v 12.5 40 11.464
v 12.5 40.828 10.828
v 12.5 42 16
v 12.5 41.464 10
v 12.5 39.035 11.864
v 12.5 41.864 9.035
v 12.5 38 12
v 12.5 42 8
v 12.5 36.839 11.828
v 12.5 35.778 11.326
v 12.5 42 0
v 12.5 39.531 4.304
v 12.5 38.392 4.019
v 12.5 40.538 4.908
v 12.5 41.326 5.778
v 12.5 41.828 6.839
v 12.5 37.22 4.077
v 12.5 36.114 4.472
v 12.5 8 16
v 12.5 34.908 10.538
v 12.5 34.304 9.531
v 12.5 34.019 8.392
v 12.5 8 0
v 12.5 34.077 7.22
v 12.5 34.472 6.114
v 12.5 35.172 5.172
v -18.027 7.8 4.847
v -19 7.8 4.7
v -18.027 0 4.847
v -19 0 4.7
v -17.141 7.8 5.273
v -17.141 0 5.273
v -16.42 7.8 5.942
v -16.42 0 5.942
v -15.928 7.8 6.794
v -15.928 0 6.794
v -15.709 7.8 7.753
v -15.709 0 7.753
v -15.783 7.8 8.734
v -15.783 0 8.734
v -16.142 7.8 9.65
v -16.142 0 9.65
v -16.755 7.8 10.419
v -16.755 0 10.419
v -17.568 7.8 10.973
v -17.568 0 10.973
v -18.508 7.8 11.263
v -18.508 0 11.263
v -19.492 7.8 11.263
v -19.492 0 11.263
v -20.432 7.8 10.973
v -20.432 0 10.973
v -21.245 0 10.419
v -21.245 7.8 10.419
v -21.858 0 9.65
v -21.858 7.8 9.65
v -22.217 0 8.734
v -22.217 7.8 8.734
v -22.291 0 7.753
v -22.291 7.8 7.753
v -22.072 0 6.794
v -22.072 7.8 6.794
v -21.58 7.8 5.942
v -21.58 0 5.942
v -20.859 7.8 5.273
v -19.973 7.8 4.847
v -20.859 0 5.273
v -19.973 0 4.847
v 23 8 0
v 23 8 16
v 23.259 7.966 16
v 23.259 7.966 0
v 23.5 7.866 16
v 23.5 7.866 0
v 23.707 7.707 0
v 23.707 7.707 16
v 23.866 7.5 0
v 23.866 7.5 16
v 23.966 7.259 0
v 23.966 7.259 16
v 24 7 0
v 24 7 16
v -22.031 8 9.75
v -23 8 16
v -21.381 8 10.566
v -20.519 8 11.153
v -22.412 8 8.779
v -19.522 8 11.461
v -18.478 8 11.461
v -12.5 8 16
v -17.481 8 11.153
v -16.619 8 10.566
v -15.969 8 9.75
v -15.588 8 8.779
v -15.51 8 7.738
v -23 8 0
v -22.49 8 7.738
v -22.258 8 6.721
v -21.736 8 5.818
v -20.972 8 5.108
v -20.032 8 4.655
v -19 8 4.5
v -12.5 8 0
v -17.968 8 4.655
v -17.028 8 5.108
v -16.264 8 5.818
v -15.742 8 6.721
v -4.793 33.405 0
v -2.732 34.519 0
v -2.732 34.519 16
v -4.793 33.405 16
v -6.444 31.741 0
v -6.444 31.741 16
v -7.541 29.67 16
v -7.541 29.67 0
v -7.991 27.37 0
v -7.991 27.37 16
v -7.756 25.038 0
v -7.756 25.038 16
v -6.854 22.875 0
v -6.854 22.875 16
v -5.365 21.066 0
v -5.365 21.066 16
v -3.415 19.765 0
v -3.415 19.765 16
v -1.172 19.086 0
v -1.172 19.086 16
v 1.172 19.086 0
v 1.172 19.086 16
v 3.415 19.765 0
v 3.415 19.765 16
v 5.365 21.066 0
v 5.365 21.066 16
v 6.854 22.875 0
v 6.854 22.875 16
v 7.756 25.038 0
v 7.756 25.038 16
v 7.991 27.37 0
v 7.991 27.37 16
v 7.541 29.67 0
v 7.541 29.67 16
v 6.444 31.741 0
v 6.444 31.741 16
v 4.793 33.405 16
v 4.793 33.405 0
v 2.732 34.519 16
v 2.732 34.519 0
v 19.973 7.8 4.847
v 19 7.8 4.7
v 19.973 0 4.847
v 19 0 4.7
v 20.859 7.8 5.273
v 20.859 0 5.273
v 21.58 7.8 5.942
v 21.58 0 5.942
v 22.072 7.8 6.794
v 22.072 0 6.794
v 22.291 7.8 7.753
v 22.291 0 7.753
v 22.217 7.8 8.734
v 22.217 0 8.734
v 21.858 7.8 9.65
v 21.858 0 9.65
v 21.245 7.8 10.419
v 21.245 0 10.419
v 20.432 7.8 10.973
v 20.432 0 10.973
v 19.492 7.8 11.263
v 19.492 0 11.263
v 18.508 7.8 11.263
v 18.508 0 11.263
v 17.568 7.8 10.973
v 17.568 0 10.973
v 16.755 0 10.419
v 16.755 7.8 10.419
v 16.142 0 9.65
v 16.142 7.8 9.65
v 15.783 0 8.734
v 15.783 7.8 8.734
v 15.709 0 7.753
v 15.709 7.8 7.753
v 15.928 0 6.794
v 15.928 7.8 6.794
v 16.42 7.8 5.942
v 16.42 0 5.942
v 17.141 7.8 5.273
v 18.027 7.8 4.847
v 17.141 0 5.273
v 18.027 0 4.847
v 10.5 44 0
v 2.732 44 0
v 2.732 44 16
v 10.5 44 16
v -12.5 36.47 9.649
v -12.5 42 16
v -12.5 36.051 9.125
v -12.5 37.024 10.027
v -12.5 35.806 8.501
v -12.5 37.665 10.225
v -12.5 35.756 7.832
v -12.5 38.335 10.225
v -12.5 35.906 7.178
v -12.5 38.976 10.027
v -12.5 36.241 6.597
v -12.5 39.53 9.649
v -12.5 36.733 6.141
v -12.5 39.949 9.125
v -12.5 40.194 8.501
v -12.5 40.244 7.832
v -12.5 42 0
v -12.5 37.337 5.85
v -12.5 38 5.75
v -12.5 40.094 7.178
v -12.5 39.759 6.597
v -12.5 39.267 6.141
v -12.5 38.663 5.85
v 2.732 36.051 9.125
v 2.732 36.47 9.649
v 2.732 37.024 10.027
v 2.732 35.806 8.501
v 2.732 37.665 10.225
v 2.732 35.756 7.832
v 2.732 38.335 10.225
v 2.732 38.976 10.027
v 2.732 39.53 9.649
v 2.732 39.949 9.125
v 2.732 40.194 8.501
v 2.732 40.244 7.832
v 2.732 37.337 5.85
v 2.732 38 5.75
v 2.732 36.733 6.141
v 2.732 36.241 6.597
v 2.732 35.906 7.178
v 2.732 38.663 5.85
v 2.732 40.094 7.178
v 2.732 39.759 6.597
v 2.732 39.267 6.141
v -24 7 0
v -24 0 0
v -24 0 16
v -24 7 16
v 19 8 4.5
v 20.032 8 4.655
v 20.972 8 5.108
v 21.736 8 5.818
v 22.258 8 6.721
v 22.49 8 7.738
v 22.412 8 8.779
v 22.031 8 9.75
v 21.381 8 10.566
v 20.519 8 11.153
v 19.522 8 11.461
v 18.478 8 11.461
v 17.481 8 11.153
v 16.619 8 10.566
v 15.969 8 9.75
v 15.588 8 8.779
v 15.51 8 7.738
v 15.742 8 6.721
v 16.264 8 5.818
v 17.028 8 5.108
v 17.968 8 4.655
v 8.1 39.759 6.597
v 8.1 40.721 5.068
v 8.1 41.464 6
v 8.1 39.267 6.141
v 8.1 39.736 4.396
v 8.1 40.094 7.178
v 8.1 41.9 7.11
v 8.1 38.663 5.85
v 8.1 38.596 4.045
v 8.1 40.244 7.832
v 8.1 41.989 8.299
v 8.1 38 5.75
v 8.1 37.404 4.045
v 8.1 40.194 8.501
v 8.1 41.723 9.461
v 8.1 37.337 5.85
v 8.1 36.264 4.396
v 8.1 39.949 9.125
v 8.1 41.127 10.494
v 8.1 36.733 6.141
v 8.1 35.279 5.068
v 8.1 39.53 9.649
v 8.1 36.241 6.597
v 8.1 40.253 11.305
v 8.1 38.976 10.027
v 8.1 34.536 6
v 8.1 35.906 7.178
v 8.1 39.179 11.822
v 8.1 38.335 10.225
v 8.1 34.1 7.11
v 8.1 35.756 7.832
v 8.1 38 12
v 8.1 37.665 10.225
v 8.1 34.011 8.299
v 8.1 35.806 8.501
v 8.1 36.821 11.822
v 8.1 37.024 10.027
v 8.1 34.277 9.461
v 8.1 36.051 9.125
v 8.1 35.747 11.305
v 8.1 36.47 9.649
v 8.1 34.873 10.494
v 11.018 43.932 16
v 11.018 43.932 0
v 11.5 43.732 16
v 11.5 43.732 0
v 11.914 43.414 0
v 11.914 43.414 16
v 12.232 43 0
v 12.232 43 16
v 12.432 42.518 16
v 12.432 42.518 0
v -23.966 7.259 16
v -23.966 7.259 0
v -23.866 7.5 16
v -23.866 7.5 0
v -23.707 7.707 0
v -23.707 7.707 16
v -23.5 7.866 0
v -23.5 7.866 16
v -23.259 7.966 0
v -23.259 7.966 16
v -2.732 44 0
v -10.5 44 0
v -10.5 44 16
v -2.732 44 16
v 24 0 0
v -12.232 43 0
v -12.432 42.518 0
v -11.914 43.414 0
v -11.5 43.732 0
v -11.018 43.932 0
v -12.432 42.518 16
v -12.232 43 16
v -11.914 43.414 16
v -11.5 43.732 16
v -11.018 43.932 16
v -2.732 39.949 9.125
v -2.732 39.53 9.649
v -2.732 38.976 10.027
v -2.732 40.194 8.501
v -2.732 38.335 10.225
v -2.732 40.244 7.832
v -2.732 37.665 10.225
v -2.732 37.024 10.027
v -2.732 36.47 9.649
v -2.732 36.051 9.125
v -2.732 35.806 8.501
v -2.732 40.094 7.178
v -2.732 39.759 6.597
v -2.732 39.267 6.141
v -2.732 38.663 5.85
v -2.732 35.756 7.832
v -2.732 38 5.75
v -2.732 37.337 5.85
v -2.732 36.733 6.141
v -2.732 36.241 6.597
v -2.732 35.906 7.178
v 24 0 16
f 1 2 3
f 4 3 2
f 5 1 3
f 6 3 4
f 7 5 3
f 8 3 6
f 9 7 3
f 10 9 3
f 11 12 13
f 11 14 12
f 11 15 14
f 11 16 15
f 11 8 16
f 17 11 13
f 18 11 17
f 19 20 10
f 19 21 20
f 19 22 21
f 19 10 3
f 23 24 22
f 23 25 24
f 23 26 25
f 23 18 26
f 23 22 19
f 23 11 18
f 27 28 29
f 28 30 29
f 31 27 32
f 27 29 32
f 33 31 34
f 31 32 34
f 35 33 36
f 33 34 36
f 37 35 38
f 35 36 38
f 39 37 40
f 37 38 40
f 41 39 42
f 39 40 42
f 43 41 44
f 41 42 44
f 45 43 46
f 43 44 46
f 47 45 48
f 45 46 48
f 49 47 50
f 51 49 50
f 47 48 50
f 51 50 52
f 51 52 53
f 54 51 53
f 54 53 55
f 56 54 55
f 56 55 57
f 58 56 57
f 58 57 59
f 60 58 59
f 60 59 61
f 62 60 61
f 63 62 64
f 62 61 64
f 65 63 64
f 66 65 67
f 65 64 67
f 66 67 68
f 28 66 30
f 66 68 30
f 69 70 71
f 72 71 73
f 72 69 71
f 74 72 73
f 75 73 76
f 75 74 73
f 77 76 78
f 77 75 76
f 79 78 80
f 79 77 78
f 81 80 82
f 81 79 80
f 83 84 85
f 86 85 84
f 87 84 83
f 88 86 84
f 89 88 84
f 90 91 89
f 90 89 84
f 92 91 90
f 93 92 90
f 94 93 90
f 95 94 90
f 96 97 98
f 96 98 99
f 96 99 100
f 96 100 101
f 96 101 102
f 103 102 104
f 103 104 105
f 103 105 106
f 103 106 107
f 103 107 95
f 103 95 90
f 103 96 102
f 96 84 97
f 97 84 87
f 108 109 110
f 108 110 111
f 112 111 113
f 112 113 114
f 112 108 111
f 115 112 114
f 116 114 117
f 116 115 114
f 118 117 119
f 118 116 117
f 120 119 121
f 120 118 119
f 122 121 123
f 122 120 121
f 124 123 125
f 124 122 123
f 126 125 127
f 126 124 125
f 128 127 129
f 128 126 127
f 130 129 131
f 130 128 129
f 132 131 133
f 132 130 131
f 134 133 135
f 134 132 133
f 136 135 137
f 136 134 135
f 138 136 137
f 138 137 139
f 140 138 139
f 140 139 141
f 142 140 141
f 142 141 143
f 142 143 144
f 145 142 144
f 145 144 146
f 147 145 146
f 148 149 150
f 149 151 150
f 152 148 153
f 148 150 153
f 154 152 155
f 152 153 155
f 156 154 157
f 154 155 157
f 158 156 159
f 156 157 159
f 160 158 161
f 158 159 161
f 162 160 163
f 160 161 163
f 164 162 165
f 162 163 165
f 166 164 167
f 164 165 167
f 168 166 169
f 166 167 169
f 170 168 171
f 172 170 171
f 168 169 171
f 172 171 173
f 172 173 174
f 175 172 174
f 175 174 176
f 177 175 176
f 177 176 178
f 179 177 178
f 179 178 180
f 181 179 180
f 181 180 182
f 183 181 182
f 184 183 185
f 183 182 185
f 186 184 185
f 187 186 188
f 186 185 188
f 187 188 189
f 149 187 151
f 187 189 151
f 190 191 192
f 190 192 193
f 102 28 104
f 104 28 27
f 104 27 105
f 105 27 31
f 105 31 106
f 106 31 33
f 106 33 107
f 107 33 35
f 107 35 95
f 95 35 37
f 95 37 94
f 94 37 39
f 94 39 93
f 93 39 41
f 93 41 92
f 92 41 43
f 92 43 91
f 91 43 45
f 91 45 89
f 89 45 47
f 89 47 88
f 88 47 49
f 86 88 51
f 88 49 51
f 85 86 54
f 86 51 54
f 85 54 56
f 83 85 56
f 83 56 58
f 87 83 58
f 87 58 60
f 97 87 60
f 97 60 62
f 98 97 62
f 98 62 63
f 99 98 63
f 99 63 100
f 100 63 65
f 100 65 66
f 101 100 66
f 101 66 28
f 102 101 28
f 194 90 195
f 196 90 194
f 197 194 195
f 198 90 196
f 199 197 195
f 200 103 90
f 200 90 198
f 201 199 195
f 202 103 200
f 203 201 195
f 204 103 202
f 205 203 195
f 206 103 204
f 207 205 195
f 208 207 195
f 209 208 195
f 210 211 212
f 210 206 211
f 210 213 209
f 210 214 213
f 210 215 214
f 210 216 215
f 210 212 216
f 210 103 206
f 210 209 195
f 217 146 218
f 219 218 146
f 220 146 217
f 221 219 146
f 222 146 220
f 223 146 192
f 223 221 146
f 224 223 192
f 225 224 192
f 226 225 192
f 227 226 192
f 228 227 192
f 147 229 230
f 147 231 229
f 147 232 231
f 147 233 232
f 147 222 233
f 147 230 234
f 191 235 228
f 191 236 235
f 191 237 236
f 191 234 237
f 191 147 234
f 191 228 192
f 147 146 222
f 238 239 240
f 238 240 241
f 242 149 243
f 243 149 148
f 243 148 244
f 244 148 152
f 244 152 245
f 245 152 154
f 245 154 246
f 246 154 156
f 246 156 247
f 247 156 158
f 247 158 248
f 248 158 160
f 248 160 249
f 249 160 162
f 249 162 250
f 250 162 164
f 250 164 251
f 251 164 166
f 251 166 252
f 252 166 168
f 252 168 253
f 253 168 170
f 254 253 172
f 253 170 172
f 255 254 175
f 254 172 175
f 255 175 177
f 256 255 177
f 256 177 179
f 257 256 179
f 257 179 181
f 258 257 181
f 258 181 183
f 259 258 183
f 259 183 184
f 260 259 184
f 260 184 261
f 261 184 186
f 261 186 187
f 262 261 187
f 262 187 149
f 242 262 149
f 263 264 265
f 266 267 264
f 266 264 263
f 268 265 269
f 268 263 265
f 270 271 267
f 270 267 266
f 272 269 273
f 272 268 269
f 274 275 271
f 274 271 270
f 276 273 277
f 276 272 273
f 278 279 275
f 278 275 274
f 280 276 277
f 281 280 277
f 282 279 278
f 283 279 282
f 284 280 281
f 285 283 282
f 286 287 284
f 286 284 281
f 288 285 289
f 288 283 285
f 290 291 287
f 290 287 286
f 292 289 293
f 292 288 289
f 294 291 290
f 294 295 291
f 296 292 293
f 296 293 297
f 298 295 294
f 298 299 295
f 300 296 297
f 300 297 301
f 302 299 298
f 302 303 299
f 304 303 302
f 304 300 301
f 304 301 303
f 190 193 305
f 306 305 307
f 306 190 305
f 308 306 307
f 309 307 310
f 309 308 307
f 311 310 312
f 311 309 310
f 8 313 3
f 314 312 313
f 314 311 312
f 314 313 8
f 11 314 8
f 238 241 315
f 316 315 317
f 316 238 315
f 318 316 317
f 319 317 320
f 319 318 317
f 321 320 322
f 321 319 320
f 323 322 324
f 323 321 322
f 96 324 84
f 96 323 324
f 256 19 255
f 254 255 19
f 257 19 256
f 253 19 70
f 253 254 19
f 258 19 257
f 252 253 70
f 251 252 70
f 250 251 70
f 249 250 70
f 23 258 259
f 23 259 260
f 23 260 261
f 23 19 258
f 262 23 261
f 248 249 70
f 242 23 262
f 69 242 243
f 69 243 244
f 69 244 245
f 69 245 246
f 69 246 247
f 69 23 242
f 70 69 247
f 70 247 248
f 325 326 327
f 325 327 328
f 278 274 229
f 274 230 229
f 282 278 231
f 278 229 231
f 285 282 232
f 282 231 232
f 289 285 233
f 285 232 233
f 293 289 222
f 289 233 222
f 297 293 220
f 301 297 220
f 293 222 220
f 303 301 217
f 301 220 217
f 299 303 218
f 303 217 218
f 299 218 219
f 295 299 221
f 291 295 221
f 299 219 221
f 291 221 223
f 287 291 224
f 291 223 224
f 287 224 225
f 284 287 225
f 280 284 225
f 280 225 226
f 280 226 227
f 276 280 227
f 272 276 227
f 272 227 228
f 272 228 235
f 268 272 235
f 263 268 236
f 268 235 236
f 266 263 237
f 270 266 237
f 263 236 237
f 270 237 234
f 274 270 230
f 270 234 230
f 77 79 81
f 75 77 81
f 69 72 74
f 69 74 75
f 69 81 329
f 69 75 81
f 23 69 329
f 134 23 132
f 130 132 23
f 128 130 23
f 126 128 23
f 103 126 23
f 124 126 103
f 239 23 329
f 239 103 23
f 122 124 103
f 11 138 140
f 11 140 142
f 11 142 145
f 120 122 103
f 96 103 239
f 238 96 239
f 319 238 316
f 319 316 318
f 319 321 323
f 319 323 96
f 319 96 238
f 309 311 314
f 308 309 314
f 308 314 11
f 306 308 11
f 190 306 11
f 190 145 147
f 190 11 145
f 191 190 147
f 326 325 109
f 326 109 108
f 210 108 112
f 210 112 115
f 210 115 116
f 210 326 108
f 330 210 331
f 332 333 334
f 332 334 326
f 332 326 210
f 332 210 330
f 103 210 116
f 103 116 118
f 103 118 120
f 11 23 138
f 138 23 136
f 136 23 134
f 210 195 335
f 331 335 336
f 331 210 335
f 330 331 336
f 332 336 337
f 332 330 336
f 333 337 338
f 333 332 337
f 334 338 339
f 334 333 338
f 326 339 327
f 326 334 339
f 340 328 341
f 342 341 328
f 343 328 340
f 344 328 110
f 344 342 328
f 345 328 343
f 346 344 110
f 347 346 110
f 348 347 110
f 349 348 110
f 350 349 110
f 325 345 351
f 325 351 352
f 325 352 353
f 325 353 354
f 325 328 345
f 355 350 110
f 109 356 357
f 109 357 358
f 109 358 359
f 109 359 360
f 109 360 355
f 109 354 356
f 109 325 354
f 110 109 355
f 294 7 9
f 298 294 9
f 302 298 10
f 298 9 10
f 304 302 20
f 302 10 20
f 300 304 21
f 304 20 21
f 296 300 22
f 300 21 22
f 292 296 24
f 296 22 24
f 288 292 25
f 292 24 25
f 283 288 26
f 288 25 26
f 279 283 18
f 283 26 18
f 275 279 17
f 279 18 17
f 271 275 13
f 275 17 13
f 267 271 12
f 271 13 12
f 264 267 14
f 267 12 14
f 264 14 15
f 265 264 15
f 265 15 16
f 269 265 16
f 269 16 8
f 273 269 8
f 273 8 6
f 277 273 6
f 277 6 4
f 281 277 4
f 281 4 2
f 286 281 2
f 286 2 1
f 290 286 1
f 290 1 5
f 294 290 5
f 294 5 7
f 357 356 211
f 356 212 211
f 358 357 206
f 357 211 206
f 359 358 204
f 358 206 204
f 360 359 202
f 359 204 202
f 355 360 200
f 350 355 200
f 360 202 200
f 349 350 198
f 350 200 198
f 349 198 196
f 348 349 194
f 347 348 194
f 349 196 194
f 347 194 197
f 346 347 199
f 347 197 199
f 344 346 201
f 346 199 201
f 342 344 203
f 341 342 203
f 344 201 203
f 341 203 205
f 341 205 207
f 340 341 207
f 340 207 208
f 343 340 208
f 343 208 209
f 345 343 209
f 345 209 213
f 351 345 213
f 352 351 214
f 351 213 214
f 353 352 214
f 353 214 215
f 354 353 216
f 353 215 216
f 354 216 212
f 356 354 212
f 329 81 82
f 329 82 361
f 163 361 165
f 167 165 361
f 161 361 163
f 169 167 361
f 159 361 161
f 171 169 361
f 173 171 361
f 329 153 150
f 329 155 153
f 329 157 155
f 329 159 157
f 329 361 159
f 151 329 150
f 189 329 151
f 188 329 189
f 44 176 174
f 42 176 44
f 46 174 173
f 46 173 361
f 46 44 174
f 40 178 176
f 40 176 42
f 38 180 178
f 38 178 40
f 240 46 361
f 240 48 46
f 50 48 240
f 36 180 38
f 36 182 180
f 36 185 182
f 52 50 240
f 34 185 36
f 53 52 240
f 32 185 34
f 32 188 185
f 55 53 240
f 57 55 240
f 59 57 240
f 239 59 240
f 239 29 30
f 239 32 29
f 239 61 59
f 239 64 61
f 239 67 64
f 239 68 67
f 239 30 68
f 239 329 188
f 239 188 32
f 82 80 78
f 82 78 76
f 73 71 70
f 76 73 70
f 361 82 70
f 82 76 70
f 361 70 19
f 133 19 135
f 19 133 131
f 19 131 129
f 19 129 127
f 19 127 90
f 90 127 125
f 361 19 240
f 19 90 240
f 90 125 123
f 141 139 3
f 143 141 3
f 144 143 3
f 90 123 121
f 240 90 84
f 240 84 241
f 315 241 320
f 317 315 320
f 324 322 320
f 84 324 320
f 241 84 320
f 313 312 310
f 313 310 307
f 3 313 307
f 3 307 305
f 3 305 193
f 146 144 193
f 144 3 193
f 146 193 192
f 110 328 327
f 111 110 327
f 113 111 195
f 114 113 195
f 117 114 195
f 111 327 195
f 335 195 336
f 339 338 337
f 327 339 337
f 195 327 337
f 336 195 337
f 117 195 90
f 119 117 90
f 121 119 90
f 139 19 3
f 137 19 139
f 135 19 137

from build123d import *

# Parameters (mm, degrees)
BOSS_EXTRUDE1_DEPTH                                  = 16
CSK_FOR_M5_HEX_SOCKET_COUNTERSUNK_CAP_SC_D           = 6.6
CSK_FOR_M5_HEX_SOCKET_COUNTERSUNK_CAP_SC_CSINK_D     = 7
CSK_FOR_M5_HEX_SOCKET_COUNTERSUNK_CAP_SC_CSINK_ANGLE = 90
CBORE_FOR_M4_HEX_SOCKET_HEAD_CAP_SCREW1_D            = 4.5
CBORE_FOR_M4_HEX_SOCKET_HEAD_CAP_SCREW1_CBORE_D      = 8
CBORE_FOR_M4_HEX_SOCKET_HEAD_CAP_SCREW1_CBORE_DEPTH  = 4.4


with BuildPart() as part:
    # Sketch1 → Boss-Extrude1 (new body)
    with BuildSketch(Plane.XY):
        with BuildLine():
            Line((24, 0), (-24, 0))
            Line((-24, 0), (-24, 7))
            ThreePointArc((-24, 7), (-23.707106781, 7.707106781), (-23, 8))
            Line((-23, 8), (-12.5, 8))
            Line((-12.5, 8), (-12.5, 42))
            ThreePointArc((-12.5, 42), (-11.914213562, 43.414213562), (-10.5, 44))
            Line((-10.5, 44), (-2.731683137, 44))
            Line((-2.731683137, 44), (-2.731683137, 34.519169318))
            ThreePointArc((-2.731683137, 34.519169318), (0, 19), (2.731683137, 34.519169318))
            Line((2.731683137, 34.519169318), (2.731683137, 44))
            Line((2.731683137, 44), (10.5, 44))
            ThreePointArc((10.5, 44), (11.914213562, 43.414213562), (12.5, 42))
            Line((12.5, 42), (12.5, 8))
            Line((12.5, 8), (23, 8))
            ThreePointArc((23, 8), (23.707106781, 7.707106781), (24, 7))
            Line((24, 7), (24, 0))
        make_face()
    extrude(amount=BOSS_EXTRUDE1_DEPTH)

    # CSK for M5 Hex Socket Countersunk Cap Screw1 (through all)
    with Locations(Plane(origin=(-19, 8, 8), x_dir=(0, 0, 1), z_dir=(0, 1, 0))):
        with Locations((0, 0), (0, 38)):
            CounterSinkHole(CSK_FOR_M5_HEX_SOCKET_COUNTERSUNK_CAP_SC_D / 2, CSK_FOR_M5_HEX_SOCKET_COUNTERSUNK_CAP_SC_CSINK_D / 2, counter_sink_angle=CSK_FOR_M5_HEX_SOCKET_COUNTERSUNK_CAP_SC_CSINK_ANGLE)

    # CBORE for M4 Hex Socket Head Cap Screw1 (through all)
    with Locations(Plane(origin=(12.5, 38, 8), x_dir=(0, 0, 1), z_dir=(1, 0, 0))):
        with Locations((0, 0)):
            CounterBoreHole(CBORE_FOR_M4_HEX_SOCKET_HEAD_CAP_SCREW1_D / 2, CBORE_FOR_M4_HEX_SOCKET_HEAD_CAP_SCREW1_CBORE_D / 2, CBORE_FOR_M4_HEX_SOCKET_HEAD_CAP_SCREW1_CBORE_DEPTH)


solid = part.part
